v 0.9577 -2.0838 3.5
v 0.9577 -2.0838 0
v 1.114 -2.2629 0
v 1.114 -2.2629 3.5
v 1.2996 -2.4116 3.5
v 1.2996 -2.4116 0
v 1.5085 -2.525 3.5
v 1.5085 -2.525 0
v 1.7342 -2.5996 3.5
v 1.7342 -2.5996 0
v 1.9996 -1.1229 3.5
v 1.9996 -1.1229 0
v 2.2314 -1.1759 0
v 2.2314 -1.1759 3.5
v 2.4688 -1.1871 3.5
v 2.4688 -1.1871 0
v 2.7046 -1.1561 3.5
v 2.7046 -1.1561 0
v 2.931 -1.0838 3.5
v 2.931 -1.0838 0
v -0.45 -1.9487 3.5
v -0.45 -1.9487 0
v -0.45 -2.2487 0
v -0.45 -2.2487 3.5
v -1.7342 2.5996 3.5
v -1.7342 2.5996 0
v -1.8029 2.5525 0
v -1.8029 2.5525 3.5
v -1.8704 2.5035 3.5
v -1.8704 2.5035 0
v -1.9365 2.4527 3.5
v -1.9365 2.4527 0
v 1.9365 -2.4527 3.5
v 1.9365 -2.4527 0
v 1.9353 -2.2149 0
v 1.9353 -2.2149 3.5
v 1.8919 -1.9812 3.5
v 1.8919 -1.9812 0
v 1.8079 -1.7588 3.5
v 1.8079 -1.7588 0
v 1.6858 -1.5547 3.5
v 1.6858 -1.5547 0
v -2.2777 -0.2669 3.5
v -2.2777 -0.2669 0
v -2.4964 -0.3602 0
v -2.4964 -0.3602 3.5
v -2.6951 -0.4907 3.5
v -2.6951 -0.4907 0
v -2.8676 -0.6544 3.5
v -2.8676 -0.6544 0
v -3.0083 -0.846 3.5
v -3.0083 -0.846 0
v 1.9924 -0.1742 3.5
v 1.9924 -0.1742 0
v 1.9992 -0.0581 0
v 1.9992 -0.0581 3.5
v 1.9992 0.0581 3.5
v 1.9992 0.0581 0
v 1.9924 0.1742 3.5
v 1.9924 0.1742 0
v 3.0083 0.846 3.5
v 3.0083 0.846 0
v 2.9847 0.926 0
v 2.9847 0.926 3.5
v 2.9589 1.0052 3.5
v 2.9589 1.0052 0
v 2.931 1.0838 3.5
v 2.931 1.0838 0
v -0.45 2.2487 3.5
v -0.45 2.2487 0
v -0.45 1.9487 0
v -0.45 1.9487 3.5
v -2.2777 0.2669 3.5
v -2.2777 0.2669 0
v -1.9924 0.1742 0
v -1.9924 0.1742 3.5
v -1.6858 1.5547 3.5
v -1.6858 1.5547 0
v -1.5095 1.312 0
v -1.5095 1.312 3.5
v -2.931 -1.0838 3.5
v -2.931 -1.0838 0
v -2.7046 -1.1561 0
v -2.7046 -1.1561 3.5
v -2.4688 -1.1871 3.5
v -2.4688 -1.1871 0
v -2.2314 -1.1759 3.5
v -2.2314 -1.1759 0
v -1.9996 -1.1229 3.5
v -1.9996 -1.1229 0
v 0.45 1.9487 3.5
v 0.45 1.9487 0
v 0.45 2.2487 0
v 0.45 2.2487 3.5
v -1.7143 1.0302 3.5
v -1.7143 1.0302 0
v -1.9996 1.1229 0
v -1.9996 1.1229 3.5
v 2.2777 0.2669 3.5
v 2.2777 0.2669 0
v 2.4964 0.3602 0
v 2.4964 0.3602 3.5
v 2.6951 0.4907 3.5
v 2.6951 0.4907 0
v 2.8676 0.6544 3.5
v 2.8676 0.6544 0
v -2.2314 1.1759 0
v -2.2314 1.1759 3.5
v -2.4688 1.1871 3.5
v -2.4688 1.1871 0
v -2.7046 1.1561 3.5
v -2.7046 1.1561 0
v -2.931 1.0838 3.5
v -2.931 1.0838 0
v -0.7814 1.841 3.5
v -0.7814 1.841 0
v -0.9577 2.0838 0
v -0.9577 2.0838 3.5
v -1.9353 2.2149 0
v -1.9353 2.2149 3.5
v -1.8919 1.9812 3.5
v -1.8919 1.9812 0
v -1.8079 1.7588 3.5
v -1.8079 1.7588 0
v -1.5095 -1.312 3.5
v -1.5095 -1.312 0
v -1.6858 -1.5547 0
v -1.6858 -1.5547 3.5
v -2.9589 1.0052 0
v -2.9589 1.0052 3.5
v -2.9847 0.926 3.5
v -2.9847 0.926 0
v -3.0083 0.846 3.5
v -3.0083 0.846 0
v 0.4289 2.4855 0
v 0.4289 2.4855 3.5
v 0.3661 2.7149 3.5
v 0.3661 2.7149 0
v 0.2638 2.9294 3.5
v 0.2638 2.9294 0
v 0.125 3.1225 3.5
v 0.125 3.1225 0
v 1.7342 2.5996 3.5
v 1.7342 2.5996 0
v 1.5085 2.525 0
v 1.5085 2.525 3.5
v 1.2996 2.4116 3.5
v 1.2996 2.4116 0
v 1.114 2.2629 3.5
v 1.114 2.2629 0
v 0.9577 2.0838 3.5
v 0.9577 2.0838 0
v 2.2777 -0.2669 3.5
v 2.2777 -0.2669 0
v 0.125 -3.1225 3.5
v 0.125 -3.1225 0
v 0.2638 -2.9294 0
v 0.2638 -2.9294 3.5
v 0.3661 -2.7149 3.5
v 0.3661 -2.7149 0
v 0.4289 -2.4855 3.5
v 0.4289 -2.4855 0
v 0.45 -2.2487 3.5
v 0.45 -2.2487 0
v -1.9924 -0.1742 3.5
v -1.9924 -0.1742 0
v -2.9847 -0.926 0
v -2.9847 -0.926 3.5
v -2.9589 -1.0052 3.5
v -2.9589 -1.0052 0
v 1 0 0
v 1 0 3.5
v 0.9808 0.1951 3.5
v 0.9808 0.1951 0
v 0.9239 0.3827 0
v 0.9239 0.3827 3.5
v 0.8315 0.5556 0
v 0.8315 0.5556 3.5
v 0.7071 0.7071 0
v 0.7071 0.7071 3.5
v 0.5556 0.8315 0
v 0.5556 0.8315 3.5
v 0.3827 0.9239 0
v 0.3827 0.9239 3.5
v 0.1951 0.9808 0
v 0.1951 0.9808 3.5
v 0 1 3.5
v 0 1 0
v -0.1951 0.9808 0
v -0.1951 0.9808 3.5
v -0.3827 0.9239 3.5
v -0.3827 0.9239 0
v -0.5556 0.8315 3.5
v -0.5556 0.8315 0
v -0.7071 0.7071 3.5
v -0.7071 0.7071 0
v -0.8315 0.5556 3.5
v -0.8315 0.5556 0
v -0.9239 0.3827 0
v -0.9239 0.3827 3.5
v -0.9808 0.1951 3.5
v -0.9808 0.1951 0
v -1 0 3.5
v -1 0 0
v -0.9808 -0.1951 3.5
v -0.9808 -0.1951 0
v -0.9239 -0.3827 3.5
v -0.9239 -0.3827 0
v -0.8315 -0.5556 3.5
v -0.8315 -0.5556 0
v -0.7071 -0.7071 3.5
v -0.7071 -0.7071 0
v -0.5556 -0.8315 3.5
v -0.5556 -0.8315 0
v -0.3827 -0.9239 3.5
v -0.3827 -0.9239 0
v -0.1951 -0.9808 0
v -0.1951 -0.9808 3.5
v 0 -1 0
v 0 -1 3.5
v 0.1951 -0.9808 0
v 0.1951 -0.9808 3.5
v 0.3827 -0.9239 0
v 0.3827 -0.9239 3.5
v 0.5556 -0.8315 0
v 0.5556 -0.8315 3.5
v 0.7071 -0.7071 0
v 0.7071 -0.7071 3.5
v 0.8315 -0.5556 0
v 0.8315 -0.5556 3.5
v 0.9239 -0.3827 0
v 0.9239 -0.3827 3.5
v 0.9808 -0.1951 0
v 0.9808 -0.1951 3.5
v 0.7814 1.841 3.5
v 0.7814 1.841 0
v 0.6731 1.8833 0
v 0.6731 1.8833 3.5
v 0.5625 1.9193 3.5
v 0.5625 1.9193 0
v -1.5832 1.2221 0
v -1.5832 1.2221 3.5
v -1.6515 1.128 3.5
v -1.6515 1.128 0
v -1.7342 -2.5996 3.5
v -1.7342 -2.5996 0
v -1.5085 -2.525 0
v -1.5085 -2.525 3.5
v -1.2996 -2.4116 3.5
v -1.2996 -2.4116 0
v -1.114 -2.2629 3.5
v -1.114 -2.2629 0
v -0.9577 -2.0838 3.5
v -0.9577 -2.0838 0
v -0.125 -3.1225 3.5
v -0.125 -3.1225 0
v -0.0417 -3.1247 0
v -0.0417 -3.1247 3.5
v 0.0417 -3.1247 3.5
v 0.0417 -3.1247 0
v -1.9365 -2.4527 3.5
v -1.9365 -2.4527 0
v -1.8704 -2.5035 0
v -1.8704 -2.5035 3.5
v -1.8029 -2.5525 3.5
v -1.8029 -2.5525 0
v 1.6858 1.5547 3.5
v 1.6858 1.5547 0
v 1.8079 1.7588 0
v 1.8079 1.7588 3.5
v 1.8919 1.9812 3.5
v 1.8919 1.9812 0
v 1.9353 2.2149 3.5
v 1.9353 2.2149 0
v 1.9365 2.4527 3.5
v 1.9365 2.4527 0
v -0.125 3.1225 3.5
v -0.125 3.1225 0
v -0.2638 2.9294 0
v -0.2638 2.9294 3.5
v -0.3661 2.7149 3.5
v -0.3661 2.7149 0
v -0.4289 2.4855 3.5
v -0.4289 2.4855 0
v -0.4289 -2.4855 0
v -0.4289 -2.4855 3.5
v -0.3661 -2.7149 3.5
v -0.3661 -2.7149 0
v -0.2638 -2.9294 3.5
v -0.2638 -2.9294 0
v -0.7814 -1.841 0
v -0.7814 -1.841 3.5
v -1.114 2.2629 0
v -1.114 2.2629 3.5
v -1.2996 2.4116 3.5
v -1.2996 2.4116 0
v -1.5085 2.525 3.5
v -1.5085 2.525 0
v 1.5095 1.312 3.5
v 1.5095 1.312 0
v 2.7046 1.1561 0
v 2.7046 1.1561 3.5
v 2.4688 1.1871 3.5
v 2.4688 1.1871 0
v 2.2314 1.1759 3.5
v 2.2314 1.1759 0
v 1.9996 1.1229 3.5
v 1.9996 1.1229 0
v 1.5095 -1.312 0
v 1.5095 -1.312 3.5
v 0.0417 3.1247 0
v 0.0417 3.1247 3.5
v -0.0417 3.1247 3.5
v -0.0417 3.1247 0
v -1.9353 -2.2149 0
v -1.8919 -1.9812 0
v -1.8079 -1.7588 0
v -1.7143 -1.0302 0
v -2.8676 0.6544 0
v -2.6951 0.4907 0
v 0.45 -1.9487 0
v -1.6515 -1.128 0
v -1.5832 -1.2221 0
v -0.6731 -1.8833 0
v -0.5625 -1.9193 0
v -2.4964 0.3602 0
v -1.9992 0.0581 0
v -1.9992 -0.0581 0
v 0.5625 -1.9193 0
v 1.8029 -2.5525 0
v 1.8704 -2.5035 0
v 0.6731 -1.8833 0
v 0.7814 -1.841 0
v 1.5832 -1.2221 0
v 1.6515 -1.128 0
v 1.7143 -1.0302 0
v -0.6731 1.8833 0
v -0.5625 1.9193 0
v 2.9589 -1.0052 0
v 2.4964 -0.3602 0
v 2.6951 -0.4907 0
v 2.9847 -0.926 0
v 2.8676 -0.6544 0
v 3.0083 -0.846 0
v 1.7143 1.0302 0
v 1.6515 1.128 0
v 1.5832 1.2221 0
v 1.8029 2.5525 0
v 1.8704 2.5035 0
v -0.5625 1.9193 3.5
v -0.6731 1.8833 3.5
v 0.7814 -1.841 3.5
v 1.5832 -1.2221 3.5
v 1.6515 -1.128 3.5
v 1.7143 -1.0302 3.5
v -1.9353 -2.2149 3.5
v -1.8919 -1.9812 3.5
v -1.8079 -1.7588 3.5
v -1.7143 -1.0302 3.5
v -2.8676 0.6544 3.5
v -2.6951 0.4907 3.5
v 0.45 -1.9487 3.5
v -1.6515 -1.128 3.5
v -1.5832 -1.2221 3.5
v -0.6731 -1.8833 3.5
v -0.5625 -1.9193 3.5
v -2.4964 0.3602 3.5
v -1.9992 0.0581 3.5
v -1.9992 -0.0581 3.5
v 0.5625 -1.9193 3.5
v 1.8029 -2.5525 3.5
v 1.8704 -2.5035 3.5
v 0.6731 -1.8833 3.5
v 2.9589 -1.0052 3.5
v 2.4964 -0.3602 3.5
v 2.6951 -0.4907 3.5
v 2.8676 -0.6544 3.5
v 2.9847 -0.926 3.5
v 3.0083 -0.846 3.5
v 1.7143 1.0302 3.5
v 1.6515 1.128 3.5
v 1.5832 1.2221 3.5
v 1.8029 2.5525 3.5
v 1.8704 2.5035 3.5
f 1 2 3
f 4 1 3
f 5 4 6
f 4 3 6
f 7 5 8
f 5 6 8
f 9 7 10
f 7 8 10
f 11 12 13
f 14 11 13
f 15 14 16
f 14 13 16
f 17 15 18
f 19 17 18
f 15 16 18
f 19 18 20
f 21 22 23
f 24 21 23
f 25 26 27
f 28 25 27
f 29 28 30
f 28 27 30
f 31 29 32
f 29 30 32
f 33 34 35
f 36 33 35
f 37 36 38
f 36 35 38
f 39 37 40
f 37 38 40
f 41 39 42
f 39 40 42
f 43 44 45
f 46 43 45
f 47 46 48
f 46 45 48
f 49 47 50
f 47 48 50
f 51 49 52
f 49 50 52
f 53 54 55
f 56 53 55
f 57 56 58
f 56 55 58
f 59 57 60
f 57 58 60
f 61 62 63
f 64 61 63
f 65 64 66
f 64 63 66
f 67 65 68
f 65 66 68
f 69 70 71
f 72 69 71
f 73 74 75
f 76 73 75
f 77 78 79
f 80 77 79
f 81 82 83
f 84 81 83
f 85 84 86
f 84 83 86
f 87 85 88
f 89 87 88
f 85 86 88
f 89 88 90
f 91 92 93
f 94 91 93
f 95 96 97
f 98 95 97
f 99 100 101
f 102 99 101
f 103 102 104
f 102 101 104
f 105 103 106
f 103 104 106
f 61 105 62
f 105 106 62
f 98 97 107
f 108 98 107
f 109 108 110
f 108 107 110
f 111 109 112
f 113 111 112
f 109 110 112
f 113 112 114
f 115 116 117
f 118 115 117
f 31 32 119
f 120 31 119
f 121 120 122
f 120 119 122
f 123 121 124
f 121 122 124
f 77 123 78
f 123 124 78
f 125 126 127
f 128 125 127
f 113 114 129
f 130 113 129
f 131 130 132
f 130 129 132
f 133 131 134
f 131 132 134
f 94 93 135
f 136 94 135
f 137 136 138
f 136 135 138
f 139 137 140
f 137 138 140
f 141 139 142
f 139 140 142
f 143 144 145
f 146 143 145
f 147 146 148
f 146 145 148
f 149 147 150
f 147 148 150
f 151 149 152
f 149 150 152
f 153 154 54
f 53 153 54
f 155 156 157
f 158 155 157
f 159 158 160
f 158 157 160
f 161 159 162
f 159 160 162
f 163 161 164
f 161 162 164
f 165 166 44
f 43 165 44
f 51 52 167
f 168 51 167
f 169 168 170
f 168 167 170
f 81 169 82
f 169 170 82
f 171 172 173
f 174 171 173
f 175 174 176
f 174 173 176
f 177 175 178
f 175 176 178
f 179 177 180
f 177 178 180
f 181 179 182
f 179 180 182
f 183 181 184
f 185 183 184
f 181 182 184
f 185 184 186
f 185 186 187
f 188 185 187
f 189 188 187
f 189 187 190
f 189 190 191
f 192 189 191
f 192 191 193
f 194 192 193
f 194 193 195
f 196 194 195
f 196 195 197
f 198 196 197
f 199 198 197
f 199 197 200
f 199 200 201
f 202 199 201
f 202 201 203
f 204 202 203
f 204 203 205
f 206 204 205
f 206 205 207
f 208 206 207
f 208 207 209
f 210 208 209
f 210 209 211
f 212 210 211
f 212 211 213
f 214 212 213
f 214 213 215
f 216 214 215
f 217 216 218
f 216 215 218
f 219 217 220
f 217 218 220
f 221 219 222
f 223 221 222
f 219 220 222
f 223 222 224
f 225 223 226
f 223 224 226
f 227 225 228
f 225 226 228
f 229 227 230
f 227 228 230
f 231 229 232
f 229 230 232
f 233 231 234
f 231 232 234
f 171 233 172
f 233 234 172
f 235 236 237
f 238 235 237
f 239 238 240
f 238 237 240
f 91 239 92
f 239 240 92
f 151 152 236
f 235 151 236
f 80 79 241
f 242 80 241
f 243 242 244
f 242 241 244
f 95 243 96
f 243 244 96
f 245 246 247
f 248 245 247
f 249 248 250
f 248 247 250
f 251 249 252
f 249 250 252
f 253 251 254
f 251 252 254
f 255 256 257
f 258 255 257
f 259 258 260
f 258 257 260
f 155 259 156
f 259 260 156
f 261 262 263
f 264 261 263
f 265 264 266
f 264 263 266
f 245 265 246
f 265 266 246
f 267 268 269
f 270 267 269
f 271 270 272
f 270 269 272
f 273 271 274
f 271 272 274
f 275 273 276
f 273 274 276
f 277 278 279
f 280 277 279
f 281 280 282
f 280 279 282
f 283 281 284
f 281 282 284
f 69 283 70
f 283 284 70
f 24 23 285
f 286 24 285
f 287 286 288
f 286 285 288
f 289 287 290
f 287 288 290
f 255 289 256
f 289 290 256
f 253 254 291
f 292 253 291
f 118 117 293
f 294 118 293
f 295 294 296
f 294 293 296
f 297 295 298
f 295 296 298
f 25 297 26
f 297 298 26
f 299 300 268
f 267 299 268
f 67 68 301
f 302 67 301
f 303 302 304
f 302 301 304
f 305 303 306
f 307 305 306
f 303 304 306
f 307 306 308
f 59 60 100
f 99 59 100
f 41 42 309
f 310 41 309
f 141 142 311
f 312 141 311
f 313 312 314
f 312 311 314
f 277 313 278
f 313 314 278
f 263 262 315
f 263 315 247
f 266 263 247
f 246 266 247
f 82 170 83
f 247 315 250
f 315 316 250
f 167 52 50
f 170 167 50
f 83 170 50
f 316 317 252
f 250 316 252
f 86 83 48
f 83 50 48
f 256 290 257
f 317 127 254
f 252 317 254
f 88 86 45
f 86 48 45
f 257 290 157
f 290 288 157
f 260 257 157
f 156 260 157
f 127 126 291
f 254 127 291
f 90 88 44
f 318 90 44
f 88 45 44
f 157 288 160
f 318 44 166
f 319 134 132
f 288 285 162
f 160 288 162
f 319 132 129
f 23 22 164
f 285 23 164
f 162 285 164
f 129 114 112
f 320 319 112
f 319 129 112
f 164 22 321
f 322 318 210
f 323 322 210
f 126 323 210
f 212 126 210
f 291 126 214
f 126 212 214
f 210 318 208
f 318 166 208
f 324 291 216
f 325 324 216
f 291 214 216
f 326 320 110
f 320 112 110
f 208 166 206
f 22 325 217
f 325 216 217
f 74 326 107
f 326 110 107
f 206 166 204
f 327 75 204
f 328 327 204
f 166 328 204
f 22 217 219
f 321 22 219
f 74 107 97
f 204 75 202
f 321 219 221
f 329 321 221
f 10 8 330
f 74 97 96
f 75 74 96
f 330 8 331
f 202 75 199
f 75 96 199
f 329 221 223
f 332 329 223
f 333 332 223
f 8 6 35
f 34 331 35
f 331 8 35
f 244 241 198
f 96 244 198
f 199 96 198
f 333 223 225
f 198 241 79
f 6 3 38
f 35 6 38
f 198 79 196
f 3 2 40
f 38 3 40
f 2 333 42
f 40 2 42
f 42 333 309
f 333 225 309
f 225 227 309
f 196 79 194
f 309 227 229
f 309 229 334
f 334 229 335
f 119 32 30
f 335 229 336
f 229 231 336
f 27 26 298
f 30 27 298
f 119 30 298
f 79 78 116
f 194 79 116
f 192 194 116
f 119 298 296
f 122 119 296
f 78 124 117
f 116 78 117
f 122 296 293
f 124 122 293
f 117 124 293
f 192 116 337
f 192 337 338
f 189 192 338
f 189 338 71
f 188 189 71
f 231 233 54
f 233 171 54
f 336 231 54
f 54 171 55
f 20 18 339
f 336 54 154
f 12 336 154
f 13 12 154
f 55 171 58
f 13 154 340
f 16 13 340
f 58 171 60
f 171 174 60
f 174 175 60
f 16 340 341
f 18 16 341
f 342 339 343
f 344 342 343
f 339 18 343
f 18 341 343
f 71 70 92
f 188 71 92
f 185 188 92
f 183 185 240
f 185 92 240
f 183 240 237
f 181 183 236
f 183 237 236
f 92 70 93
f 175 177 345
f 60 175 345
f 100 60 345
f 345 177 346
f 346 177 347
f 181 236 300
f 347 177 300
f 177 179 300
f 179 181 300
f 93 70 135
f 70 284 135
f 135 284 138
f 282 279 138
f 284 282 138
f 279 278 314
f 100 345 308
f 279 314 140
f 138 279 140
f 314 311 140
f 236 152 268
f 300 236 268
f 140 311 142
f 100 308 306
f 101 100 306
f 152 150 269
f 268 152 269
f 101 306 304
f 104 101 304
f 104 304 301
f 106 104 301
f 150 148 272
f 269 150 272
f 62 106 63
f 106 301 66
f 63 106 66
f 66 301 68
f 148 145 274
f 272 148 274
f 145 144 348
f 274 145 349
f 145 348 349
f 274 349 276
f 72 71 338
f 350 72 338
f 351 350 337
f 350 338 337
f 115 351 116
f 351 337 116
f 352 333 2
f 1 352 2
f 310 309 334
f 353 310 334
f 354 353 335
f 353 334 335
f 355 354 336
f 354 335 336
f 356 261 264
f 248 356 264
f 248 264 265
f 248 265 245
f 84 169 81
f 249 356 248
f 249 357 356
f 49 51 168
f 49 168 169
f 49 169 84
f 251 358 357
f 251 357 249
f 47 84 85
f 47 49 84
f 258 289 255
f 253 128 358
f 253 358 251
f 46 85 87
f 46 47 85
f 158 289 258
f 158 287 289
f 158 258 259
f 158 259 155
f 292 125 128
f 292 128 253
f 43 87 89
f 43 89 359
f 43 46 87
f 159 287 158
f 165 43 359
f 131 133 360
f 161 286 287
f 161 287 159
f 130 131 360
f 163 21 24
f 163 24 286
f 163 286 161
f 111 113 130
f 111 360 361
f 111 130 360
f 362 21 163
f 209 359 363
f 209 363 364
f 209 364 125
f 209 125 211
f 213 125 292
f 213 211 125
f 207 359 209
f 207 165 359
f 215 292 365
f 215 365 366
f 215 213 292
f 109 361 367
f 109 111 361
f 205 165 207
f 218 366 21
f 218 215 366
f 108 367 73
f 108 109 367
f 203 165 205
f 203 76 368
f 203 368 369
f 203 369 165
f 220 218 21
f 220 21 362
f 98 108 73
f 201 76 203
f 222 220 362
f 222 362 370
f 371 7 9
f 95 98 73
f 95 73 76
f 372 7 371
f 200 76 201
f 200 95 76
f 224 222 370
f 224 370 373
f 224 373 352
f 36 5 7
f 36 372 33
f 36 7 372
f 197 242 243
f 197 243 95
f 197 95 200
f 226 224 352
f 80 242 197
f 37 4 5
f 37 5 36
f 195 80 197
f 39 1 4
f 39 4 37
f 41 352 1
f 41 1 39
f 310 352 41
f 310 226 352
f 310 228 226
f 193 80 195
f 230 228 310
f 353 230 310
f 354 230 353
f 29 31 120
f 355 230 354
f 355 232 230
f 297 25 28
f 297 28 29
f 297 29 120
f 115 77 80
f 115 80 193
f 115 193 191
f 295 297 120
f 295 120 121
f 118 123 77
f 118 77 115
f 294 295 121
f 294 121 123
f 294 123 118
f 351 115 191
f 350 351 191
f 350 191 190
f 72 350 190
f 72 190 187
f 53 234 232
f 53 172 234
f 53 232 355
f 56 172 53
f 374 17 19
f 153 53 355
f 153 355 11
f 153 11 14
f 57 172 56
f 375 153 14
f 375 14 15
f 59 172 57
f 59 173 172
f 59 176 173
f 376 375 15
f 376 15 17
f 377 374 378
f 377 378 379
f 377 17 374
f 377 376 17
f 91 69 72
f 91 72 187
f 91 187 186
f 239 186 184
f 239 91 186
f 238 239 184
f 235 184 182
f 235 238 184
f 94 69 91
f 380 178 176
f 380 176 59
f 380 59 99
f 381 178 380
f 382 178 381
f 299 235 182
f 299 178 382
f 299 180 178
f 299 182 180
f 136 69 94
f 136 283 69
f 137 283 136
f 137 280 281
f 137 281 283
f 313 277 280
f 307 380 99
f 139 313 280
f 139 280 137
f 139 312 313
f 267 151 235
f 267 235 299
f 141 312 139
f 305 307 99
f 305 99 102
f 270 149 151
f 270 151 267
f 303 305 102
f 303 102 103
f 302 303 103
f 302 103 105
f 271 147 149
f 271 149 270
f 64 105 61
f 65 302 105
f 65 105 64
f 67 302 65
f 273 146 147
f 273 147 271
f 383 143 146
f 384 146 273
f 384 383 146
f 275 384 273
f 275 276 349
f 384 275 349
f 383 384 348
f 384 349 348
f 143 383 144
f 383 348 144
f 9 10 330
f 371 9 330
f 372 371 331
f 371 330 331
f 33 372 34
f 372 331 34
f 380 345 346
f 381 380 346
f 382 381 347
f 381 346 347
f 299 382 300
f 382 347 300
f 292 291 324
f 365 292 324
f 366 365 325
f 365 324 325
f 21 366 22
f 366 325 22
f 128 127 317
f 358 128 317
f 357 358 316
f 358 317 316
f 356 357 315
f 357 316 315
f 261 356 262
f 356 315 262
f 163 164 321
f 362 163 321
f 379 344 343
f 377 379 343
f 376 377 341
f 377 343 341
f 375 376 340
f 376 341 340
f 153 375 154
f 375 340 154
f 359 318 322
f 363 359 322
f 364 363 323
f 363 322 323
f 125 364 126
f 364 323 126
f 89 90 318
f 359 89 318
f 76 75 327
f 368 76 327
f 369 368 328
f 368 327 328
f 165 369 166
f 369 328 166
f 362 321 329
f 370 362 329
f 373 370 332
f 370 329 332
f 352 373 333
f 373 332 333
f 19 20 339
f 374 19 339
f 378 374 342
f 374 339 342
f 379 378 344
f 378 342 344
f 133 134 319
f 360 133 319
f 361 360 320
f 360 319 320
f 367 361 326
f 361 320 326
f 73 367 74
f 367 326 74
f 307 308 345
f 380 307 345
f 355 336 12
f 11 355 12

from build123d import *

# Parameters (mm, degrees)
ESBO_O1_R                = 2
RESSALTO_EXTRUS_O1_DEPTH = 3.5
CORTE_EXTRUS_O1_REACH    = 7.574
ESBO_O2_R                = 1


with BuildPart() as part:
    # Esboço1 → Ressalto-extrusão1 (new body)
    with BuildSketch(Plane.XY):
        Circle(ESBO_O1_R)
        with BuildLine():
            Line((-1.99959981, -1.122867364), (-1.714282855, -1.030162265))
            ThreePointArc((-1.714282855, -1.030162265), (-1.902113033, -0.618033989), (-1.99239815, -0.174211401))
            Line((-1.99239815, -0.174211401), (-2.277715105, -0.266916499))
            ThreePointArc((-2.277715105, -0.266916499), (-2.695113044, -0.490735084), (-3.008300145, -0.846023191))
            ThreePointArc((-3.008300145, -0.846023191), (-2.972051613, -0.965678107), (-2.931045896, -1.08378732))
            ThreePointArc((-2.931045896, -1.08378732), (-2.4688391, -1.187134677), (-1.99959981, -1.122867364))
        make_face()
        with BuildLine():
            Line((-2.277715105, 0.266916499), (-1.99239815, 0.174211401))
            ThreePointArc((-1.99239815, 0.174211401), (-1.902113033, 0.618033989), (-1.714282855, 1.030162265))
            Line((-1.714282855, 1.030162265), (-1.99959981, 1.122867364))
            ThreePointArc((-1.99959981, 1.122867364), (-2.4688391, 1.187134677), (-2.931045896, 1.08378732))
            ThreePointArc((-2.931045896, 1.08378732), (-2.972051613, 0.965678107), (-3.008300145, 0.846023191))
            ThreePointArc((-3.008300145, 0.846023191), (-2.695113044, 0.490735084), (-2.277715105, 0.266916499))
        make_face()
        with BuildLine():
            Line((-1.685820646, 1.554747331), (-1.509485071, 1.312042233))
            ThreePointArc((-1.509485071, 1.312042233), (-1.175570505, 1.618033989), (-0.781369776, 1.84104896))
            Line((-0.781369776, 1.84104896), (-0.957705351, 2.083754058))
            ThreePointArc((-0.957705351, 2.083754058), (-1.299552532, 2.411559342), (-1.734231738, 2.599627912))
            ThreePointArc((-1.734231738, 2.599627912), (-1.836828913, 2.528178107), (-1.936485986, 2.452681599))
            ThreePointArc((-1.936485986, 2.452681599), (-1.891945409, 1.981160724), (-1.685820646, 1.554747331))
        make_face()
        with BuildLine():
            Line((-0.45, 2.248717527), (-0.45, 1.948717527))
            ThreePointArc((-0.45, 1.948717527), (0, 2), (0.45, 1.948717527))
            Line((0.45, 1.948717527), (0.45, 2.248717527))
            ThreePointArc((0.45, 2.248717527), (0.366118933, 2.714850303), (0.125, 3.122498999))
            ThreePointArc((0.125, 3.122498999), (0, 3.125), (-0.125, 3.122498999))
            ThreePointArc((-0.125, 3.122498999), (-0.366118933, 2.714850303), (-0.45, 2.248717527))
        make_face()
        with BuildLine():
            ThreePointArc((0.781369776, 1.84104896), (1.175570505, 1.618033989), (1.509485071, 1.312042233))
            Line((1.509485071, 1.312042233), (1.685820646, 1.554747331))
            ThreePointArc((1.685820646, 1.554747331), (1.891945409, 1.981160724), (1.936485986, 2.452681599))
            ThreePointArc((1.936485986, 2.452681599), (1.836828913, 2.528178107), (1.734231738, 2.599627912))
            ThreePointArc((1.734231738, 2.599627912), (1.299552532, 2.411559342), (0.957705351, 2.083754058))
            Line((0.957705351, 2.083754058), (0.781369776, 1.84104896))
        make_face()
        with BuildLine():
            ThreePointArc((1.714282855, 1.030162265), (1.902113033, 0.618033989), (1.99239815, 0.174211401))
            Line((1.99239815, 0.174211401), (2.277715105, 0.266916499))
            ThreePointArc((2.277715105, 0.266916499), (2.695113044, 0.490735084), (3.008300145, 0.846023191))
            ThreePointArc((3.008300145, 0.846023191), (2.972051613, 0.965678107), (2.931045896, 1.08378732))
            ThreePointArc((2.931045896, 1.08378732), (2.4688391, 1.187134677), (1.99959981, 1.122867364))
            Line((1.99959981, 1.122867364), (1.714282855, 1.030162265))
        make_face()
        with BuildLine():
            ThreePointArc((1.99239815, -0.174211401), (1.902113033, -0.618033989), (1.714282855, -1.030162265))
            Line((1.714282855, -1.030162265), (1.99959981, -1.122867364))
            ThreePointArc((1.99959981, -1.122867364), (2.4688391, -1.187134677), (2.931045896, -1.08378732))
            ThreePointArc((2.931045896, -1.08378732), (2.972051613, -0.965678107), (3.008300145, -0.846023191))
            ThreePointArc((3.008300145, -0.846023191), (2.695113044, -0.490735084), (2.277715105, -0.266916499))
            Line((2.277715105, -0.266916499), (1.99239815, -0.174211401))
        make_face()
        with BuildLine():
            ThreePointArc((1.509485071, -1.312042233), (1.175570505, -1.618033989), (0.781369776, -1.84104896))
            Line((0.781369776, -1.84104896), (0.957705351, -2.083754058))
            ThreePointArc((0.957705351, -2.083754058), (1.299552532, -2.411559342), (1.734231738, -2.599627912))
            ThreePointArc((1.734231738, -2.599627912), (1.836828913, -2.528178107), (1.936485986, -2.452681599))
            ThreePointArc((1.936485986, -2.452681599), (1.891945409, -1.981160724), (1.685820646, -1.554747331))
            Line((1.685820646, -1.554747331), (1.509485071, -1.312042233))
        make_face()
        with BuildLine():
            Line((-0.45, -1.948717527), (-0.45, -2.248717527))
            ThreePointArc((-0.45, -2.248717527), (-0.366118933, -2.714850303), (-0.125, -3.122498999))
            ThreePointArc((-0.125, -3.122498999), (0, -3.125), (0.125, -3.122498999))
            ThreePointArc((0.125, -3.122498999), (0.366118933, -2.714850303), (0.45, -2.248717527))
            Line((0.45, -2.248717527), (0.45, -1.948717527))
            ThreePointArc((0.45, -1.948717527), (0, -2), (-0.45, -1.948717527))
        make_face()
        with BuildLine():
            Line((-0.957705351, -2.083754058), (-0.781369776, -1.84104896))
            ThreePointArc((-0.781369776, -1.84104896), (-1.175570505, -1.618033989), (-1.509485071, -1.312042233))
            Line((-1.509485071, -1.312042233), (-1.685820646, -1.554747331))
            ThreePointArc((-1.685820646, -1.554747331), (-1.891945409, -1.981160724), (-1.936485986, -2.452681599))
            ThreePointArc((-1.936485986, -2.452681599), (-1.836828913, -2.528178107), (-1.734231738, -2.599627912))
            ThreePointArc((-1.734231738, -2.599627912), (-1.299552532, -2.411559342), (-0.957705351, -2.083754058))
        make_face()
    extrude(amount=RESSALTO_EXTRUS_O1_DEPTH)

    # Esboço2 → Corte-extrusão1 (cut, up to next)
    with BuildSketch(Plane.XY.offset(3.5), mode=Mode.PRIVATE) as corte_extrus_o1_sk1:
        Circle(ESBO_O2_R)
    corte_extrus_o1_tool1 = extrude(corte_extrus_o1_sk1.sketch, amount=-CORTE_EXTRUS_O1_REACH, mode=Mode.PRIVATE) & part.part
    add(corte_extrus_o1_tool1.solids().sort_by_distance((0, 0, 3.5))[0], mode=Mode.SUBTRACT)


solid = part.part
